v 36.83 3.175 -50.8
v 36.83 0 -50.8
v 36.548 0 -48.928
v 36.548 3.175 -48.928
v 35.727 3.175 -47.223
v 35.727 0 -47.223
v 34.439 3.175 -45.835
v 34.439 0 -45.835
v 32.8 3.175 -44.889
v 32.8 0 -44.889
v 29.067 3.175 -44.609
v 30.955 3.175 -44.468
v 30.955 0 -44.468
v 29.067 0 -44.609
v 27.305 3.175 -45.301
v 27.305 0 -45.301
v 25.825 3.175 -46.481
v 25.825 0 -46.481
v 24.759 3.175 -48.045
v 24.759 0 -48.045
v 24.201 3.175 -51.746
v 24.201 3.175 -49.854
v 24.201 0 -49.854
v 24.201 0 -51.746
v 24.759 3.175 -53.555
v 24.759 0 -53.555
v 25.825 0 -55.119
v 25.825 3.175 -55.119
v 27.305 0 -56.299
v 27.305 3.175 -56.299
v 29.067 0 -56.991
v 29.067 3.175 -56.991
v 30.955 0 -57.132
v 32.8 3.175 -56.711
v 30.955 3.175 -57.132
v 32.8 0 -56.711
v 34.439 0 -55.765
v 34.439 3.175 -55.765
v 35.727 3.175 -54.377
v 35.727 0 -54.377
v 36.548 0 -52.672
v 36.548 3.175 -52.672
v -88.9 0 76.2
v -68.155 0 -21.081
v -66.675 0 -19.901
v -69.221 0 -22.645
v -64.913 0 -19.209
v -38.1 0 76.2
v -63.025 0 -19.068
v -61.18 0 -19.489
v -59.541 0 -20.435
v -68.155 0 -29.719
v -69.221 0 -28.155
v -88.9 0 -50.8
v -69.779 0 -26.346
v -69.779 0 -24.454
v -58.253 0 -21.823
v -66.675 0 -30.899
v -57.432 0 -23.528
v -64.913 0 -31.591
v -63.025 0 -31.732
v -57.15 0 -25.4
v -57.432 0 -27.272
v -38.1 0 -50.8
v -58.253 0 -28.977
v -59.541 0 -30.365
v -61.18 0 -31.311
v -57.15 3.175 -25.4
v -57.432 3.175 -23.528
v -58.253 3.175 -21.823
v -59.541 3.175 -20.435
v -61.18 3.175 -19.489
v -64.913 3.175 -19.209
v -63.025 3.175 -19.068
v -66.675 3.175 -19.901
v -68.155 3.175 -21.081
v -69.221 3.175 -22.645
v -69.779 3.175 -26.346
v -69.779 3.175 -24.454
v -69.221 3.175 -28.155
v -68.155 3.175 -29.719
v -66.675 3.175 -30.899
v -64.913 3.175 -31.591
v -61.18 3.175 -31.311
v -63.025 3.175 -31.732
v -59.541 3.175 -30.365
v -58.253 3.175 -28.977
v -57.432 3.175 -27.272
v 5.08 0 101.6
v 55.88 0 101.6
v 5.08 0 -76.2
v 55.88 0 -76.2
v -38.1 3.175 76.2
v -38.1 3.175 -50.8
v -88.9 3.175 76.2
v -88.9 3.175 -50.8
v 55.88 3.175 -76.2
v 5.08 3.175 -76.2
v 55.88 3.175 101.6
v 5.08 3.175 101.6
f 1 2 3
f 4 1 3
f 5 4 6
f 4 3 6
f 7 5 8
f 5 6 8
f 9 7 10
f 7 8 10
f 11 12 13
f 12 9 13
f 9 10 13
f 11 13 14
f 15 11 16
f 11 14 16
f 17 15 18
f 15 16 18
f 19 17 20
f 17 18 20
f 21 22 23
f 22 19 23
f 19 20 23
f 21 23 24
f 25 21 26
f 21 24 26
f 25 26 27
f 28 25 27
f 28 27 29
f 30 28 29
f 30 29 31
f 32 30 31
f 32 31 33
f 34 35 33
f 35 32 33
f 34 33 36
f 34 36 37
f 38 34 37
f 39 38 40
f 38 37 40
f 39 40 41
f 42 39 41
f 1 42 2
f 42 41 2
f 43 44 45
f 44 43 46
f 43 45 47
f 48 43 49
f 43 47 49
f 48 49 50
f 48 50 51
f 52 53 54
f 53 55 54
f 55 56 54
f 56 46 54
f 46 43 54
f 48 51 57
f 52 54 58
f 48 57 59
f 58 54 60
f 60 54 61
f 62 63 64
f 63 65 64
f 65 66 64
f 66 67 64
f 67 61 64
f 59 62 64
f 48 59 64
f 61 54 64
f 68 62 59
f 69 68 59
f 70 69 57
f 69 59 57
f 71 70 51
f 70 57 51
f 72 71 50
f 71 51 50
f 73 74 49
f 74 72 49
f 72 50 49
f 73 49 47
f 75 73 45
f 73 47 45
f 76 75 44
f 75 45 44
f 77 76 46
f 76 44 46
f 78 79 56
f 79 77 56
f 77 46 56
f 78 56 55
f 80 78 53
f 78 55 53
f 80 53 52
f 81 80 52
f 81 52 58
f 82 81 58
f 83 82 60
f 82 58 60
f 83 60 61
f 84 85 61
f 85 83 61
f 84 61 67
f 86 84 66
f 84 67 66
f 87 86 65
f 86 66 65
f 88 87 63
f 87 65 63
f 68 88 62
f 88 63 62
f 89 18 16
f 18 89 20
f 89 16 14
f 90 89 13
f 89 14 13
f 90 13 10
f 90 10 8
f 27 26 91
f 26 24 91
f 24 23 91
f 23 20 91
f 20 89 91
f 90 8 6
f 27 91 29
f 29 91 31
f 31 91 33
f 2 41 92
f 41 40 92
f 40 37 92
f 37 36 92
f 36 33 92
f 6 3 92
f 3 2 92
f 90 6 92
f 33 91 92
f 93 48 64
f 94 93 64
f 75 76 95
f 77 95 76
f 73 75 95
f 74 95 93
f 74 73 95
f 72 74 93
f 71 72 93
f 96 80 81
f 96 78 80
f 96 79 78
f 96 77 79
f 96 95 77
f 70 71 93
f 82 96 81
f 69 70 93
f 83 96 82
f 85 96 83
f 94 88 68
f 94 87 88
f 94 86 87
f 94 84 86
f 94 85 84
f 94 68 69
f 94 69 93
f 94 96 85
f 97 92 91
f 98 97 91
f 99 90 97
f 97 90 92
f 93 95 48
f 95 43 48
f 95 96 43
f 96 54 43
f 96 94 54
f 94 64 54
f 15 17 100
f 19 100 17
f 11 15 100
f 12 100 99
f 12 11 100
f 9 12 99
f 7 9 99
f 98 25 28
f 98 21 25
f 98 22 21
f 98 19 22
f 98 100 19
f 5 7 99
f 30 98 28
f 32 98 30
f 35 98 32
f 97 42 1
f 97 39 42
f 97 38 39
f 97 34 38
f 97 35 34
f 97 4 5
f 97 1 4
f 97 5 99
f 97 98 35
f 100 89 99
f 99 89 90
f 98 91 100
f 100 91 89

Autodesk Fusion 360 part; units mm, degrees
sketch "Sketch1" plane through (0, 0, 0) normal (0, 1, 0) x (1, 0, 0)
  line L0 (-38.1, 50.8) -> (-88.9, 50.8)
  line L1 (-88.9, 50.8) -> (-88.9, -76.2)
  line L2 (-88.9, -76.2) -> (-38.1, -76.2)
  line L3 (-38.1, -76.2) -> (-38.1, 50.8)
  line L4 (55.88, 76.2) -> (5.08, 76.2)
  line L5 (5.08, 76.2) -> (5.08, -101.6)
  line L6 (5.08, -101.6) -> (55.88, -101.6)
  line L7 (55.88, -101.6) -> (55.88, 76.2)
  line L8 (-63.5, 50.8) -> (-63.5, 25.4) construction
  line L9 (30.48, 76.2) -> (30.48, 50.8) construction
  circle A0 centre (-63.5, 25.4) radius 6.35
  circle A1 centre (30.48, 50.8) radius 6.35
  point P0 (-63.5, 0)
  point P1 (30.48, 0)
  dimension "d1" = 50.8
  dimension "d2" = 127
  dimension "d3" = 50.8
  dimension "d4" = 177.8
extrude "Extrude1" add sketch "Sketch1" along normal blind 3.175 makes body 1 at (-63.3418, 0, 44.4441) makes body 2 at (30.6382, 0, 52.9107)
copy_body "Body->Comp1" bodies 1 removing the originals makes body 3 in component "Small Top Anvil Mount"
copy_body "Body->Comp2" bodies 2 removing the originals makes body 4 in component "Tall Top Anvil Mount"
component "Small Top Anvil Mount" placed x (1, 0, 0) y (0, 1, 0) z (0, 0, 1) at (0, 0, 0)
component "Tall Top Anvil Mount" placed x (1, 0, 0) y (0, 1, 0) z (0, 0, 1) at (0, 0, 0)
equation "d9 = ( 1 / 8 ) * 1 in"
